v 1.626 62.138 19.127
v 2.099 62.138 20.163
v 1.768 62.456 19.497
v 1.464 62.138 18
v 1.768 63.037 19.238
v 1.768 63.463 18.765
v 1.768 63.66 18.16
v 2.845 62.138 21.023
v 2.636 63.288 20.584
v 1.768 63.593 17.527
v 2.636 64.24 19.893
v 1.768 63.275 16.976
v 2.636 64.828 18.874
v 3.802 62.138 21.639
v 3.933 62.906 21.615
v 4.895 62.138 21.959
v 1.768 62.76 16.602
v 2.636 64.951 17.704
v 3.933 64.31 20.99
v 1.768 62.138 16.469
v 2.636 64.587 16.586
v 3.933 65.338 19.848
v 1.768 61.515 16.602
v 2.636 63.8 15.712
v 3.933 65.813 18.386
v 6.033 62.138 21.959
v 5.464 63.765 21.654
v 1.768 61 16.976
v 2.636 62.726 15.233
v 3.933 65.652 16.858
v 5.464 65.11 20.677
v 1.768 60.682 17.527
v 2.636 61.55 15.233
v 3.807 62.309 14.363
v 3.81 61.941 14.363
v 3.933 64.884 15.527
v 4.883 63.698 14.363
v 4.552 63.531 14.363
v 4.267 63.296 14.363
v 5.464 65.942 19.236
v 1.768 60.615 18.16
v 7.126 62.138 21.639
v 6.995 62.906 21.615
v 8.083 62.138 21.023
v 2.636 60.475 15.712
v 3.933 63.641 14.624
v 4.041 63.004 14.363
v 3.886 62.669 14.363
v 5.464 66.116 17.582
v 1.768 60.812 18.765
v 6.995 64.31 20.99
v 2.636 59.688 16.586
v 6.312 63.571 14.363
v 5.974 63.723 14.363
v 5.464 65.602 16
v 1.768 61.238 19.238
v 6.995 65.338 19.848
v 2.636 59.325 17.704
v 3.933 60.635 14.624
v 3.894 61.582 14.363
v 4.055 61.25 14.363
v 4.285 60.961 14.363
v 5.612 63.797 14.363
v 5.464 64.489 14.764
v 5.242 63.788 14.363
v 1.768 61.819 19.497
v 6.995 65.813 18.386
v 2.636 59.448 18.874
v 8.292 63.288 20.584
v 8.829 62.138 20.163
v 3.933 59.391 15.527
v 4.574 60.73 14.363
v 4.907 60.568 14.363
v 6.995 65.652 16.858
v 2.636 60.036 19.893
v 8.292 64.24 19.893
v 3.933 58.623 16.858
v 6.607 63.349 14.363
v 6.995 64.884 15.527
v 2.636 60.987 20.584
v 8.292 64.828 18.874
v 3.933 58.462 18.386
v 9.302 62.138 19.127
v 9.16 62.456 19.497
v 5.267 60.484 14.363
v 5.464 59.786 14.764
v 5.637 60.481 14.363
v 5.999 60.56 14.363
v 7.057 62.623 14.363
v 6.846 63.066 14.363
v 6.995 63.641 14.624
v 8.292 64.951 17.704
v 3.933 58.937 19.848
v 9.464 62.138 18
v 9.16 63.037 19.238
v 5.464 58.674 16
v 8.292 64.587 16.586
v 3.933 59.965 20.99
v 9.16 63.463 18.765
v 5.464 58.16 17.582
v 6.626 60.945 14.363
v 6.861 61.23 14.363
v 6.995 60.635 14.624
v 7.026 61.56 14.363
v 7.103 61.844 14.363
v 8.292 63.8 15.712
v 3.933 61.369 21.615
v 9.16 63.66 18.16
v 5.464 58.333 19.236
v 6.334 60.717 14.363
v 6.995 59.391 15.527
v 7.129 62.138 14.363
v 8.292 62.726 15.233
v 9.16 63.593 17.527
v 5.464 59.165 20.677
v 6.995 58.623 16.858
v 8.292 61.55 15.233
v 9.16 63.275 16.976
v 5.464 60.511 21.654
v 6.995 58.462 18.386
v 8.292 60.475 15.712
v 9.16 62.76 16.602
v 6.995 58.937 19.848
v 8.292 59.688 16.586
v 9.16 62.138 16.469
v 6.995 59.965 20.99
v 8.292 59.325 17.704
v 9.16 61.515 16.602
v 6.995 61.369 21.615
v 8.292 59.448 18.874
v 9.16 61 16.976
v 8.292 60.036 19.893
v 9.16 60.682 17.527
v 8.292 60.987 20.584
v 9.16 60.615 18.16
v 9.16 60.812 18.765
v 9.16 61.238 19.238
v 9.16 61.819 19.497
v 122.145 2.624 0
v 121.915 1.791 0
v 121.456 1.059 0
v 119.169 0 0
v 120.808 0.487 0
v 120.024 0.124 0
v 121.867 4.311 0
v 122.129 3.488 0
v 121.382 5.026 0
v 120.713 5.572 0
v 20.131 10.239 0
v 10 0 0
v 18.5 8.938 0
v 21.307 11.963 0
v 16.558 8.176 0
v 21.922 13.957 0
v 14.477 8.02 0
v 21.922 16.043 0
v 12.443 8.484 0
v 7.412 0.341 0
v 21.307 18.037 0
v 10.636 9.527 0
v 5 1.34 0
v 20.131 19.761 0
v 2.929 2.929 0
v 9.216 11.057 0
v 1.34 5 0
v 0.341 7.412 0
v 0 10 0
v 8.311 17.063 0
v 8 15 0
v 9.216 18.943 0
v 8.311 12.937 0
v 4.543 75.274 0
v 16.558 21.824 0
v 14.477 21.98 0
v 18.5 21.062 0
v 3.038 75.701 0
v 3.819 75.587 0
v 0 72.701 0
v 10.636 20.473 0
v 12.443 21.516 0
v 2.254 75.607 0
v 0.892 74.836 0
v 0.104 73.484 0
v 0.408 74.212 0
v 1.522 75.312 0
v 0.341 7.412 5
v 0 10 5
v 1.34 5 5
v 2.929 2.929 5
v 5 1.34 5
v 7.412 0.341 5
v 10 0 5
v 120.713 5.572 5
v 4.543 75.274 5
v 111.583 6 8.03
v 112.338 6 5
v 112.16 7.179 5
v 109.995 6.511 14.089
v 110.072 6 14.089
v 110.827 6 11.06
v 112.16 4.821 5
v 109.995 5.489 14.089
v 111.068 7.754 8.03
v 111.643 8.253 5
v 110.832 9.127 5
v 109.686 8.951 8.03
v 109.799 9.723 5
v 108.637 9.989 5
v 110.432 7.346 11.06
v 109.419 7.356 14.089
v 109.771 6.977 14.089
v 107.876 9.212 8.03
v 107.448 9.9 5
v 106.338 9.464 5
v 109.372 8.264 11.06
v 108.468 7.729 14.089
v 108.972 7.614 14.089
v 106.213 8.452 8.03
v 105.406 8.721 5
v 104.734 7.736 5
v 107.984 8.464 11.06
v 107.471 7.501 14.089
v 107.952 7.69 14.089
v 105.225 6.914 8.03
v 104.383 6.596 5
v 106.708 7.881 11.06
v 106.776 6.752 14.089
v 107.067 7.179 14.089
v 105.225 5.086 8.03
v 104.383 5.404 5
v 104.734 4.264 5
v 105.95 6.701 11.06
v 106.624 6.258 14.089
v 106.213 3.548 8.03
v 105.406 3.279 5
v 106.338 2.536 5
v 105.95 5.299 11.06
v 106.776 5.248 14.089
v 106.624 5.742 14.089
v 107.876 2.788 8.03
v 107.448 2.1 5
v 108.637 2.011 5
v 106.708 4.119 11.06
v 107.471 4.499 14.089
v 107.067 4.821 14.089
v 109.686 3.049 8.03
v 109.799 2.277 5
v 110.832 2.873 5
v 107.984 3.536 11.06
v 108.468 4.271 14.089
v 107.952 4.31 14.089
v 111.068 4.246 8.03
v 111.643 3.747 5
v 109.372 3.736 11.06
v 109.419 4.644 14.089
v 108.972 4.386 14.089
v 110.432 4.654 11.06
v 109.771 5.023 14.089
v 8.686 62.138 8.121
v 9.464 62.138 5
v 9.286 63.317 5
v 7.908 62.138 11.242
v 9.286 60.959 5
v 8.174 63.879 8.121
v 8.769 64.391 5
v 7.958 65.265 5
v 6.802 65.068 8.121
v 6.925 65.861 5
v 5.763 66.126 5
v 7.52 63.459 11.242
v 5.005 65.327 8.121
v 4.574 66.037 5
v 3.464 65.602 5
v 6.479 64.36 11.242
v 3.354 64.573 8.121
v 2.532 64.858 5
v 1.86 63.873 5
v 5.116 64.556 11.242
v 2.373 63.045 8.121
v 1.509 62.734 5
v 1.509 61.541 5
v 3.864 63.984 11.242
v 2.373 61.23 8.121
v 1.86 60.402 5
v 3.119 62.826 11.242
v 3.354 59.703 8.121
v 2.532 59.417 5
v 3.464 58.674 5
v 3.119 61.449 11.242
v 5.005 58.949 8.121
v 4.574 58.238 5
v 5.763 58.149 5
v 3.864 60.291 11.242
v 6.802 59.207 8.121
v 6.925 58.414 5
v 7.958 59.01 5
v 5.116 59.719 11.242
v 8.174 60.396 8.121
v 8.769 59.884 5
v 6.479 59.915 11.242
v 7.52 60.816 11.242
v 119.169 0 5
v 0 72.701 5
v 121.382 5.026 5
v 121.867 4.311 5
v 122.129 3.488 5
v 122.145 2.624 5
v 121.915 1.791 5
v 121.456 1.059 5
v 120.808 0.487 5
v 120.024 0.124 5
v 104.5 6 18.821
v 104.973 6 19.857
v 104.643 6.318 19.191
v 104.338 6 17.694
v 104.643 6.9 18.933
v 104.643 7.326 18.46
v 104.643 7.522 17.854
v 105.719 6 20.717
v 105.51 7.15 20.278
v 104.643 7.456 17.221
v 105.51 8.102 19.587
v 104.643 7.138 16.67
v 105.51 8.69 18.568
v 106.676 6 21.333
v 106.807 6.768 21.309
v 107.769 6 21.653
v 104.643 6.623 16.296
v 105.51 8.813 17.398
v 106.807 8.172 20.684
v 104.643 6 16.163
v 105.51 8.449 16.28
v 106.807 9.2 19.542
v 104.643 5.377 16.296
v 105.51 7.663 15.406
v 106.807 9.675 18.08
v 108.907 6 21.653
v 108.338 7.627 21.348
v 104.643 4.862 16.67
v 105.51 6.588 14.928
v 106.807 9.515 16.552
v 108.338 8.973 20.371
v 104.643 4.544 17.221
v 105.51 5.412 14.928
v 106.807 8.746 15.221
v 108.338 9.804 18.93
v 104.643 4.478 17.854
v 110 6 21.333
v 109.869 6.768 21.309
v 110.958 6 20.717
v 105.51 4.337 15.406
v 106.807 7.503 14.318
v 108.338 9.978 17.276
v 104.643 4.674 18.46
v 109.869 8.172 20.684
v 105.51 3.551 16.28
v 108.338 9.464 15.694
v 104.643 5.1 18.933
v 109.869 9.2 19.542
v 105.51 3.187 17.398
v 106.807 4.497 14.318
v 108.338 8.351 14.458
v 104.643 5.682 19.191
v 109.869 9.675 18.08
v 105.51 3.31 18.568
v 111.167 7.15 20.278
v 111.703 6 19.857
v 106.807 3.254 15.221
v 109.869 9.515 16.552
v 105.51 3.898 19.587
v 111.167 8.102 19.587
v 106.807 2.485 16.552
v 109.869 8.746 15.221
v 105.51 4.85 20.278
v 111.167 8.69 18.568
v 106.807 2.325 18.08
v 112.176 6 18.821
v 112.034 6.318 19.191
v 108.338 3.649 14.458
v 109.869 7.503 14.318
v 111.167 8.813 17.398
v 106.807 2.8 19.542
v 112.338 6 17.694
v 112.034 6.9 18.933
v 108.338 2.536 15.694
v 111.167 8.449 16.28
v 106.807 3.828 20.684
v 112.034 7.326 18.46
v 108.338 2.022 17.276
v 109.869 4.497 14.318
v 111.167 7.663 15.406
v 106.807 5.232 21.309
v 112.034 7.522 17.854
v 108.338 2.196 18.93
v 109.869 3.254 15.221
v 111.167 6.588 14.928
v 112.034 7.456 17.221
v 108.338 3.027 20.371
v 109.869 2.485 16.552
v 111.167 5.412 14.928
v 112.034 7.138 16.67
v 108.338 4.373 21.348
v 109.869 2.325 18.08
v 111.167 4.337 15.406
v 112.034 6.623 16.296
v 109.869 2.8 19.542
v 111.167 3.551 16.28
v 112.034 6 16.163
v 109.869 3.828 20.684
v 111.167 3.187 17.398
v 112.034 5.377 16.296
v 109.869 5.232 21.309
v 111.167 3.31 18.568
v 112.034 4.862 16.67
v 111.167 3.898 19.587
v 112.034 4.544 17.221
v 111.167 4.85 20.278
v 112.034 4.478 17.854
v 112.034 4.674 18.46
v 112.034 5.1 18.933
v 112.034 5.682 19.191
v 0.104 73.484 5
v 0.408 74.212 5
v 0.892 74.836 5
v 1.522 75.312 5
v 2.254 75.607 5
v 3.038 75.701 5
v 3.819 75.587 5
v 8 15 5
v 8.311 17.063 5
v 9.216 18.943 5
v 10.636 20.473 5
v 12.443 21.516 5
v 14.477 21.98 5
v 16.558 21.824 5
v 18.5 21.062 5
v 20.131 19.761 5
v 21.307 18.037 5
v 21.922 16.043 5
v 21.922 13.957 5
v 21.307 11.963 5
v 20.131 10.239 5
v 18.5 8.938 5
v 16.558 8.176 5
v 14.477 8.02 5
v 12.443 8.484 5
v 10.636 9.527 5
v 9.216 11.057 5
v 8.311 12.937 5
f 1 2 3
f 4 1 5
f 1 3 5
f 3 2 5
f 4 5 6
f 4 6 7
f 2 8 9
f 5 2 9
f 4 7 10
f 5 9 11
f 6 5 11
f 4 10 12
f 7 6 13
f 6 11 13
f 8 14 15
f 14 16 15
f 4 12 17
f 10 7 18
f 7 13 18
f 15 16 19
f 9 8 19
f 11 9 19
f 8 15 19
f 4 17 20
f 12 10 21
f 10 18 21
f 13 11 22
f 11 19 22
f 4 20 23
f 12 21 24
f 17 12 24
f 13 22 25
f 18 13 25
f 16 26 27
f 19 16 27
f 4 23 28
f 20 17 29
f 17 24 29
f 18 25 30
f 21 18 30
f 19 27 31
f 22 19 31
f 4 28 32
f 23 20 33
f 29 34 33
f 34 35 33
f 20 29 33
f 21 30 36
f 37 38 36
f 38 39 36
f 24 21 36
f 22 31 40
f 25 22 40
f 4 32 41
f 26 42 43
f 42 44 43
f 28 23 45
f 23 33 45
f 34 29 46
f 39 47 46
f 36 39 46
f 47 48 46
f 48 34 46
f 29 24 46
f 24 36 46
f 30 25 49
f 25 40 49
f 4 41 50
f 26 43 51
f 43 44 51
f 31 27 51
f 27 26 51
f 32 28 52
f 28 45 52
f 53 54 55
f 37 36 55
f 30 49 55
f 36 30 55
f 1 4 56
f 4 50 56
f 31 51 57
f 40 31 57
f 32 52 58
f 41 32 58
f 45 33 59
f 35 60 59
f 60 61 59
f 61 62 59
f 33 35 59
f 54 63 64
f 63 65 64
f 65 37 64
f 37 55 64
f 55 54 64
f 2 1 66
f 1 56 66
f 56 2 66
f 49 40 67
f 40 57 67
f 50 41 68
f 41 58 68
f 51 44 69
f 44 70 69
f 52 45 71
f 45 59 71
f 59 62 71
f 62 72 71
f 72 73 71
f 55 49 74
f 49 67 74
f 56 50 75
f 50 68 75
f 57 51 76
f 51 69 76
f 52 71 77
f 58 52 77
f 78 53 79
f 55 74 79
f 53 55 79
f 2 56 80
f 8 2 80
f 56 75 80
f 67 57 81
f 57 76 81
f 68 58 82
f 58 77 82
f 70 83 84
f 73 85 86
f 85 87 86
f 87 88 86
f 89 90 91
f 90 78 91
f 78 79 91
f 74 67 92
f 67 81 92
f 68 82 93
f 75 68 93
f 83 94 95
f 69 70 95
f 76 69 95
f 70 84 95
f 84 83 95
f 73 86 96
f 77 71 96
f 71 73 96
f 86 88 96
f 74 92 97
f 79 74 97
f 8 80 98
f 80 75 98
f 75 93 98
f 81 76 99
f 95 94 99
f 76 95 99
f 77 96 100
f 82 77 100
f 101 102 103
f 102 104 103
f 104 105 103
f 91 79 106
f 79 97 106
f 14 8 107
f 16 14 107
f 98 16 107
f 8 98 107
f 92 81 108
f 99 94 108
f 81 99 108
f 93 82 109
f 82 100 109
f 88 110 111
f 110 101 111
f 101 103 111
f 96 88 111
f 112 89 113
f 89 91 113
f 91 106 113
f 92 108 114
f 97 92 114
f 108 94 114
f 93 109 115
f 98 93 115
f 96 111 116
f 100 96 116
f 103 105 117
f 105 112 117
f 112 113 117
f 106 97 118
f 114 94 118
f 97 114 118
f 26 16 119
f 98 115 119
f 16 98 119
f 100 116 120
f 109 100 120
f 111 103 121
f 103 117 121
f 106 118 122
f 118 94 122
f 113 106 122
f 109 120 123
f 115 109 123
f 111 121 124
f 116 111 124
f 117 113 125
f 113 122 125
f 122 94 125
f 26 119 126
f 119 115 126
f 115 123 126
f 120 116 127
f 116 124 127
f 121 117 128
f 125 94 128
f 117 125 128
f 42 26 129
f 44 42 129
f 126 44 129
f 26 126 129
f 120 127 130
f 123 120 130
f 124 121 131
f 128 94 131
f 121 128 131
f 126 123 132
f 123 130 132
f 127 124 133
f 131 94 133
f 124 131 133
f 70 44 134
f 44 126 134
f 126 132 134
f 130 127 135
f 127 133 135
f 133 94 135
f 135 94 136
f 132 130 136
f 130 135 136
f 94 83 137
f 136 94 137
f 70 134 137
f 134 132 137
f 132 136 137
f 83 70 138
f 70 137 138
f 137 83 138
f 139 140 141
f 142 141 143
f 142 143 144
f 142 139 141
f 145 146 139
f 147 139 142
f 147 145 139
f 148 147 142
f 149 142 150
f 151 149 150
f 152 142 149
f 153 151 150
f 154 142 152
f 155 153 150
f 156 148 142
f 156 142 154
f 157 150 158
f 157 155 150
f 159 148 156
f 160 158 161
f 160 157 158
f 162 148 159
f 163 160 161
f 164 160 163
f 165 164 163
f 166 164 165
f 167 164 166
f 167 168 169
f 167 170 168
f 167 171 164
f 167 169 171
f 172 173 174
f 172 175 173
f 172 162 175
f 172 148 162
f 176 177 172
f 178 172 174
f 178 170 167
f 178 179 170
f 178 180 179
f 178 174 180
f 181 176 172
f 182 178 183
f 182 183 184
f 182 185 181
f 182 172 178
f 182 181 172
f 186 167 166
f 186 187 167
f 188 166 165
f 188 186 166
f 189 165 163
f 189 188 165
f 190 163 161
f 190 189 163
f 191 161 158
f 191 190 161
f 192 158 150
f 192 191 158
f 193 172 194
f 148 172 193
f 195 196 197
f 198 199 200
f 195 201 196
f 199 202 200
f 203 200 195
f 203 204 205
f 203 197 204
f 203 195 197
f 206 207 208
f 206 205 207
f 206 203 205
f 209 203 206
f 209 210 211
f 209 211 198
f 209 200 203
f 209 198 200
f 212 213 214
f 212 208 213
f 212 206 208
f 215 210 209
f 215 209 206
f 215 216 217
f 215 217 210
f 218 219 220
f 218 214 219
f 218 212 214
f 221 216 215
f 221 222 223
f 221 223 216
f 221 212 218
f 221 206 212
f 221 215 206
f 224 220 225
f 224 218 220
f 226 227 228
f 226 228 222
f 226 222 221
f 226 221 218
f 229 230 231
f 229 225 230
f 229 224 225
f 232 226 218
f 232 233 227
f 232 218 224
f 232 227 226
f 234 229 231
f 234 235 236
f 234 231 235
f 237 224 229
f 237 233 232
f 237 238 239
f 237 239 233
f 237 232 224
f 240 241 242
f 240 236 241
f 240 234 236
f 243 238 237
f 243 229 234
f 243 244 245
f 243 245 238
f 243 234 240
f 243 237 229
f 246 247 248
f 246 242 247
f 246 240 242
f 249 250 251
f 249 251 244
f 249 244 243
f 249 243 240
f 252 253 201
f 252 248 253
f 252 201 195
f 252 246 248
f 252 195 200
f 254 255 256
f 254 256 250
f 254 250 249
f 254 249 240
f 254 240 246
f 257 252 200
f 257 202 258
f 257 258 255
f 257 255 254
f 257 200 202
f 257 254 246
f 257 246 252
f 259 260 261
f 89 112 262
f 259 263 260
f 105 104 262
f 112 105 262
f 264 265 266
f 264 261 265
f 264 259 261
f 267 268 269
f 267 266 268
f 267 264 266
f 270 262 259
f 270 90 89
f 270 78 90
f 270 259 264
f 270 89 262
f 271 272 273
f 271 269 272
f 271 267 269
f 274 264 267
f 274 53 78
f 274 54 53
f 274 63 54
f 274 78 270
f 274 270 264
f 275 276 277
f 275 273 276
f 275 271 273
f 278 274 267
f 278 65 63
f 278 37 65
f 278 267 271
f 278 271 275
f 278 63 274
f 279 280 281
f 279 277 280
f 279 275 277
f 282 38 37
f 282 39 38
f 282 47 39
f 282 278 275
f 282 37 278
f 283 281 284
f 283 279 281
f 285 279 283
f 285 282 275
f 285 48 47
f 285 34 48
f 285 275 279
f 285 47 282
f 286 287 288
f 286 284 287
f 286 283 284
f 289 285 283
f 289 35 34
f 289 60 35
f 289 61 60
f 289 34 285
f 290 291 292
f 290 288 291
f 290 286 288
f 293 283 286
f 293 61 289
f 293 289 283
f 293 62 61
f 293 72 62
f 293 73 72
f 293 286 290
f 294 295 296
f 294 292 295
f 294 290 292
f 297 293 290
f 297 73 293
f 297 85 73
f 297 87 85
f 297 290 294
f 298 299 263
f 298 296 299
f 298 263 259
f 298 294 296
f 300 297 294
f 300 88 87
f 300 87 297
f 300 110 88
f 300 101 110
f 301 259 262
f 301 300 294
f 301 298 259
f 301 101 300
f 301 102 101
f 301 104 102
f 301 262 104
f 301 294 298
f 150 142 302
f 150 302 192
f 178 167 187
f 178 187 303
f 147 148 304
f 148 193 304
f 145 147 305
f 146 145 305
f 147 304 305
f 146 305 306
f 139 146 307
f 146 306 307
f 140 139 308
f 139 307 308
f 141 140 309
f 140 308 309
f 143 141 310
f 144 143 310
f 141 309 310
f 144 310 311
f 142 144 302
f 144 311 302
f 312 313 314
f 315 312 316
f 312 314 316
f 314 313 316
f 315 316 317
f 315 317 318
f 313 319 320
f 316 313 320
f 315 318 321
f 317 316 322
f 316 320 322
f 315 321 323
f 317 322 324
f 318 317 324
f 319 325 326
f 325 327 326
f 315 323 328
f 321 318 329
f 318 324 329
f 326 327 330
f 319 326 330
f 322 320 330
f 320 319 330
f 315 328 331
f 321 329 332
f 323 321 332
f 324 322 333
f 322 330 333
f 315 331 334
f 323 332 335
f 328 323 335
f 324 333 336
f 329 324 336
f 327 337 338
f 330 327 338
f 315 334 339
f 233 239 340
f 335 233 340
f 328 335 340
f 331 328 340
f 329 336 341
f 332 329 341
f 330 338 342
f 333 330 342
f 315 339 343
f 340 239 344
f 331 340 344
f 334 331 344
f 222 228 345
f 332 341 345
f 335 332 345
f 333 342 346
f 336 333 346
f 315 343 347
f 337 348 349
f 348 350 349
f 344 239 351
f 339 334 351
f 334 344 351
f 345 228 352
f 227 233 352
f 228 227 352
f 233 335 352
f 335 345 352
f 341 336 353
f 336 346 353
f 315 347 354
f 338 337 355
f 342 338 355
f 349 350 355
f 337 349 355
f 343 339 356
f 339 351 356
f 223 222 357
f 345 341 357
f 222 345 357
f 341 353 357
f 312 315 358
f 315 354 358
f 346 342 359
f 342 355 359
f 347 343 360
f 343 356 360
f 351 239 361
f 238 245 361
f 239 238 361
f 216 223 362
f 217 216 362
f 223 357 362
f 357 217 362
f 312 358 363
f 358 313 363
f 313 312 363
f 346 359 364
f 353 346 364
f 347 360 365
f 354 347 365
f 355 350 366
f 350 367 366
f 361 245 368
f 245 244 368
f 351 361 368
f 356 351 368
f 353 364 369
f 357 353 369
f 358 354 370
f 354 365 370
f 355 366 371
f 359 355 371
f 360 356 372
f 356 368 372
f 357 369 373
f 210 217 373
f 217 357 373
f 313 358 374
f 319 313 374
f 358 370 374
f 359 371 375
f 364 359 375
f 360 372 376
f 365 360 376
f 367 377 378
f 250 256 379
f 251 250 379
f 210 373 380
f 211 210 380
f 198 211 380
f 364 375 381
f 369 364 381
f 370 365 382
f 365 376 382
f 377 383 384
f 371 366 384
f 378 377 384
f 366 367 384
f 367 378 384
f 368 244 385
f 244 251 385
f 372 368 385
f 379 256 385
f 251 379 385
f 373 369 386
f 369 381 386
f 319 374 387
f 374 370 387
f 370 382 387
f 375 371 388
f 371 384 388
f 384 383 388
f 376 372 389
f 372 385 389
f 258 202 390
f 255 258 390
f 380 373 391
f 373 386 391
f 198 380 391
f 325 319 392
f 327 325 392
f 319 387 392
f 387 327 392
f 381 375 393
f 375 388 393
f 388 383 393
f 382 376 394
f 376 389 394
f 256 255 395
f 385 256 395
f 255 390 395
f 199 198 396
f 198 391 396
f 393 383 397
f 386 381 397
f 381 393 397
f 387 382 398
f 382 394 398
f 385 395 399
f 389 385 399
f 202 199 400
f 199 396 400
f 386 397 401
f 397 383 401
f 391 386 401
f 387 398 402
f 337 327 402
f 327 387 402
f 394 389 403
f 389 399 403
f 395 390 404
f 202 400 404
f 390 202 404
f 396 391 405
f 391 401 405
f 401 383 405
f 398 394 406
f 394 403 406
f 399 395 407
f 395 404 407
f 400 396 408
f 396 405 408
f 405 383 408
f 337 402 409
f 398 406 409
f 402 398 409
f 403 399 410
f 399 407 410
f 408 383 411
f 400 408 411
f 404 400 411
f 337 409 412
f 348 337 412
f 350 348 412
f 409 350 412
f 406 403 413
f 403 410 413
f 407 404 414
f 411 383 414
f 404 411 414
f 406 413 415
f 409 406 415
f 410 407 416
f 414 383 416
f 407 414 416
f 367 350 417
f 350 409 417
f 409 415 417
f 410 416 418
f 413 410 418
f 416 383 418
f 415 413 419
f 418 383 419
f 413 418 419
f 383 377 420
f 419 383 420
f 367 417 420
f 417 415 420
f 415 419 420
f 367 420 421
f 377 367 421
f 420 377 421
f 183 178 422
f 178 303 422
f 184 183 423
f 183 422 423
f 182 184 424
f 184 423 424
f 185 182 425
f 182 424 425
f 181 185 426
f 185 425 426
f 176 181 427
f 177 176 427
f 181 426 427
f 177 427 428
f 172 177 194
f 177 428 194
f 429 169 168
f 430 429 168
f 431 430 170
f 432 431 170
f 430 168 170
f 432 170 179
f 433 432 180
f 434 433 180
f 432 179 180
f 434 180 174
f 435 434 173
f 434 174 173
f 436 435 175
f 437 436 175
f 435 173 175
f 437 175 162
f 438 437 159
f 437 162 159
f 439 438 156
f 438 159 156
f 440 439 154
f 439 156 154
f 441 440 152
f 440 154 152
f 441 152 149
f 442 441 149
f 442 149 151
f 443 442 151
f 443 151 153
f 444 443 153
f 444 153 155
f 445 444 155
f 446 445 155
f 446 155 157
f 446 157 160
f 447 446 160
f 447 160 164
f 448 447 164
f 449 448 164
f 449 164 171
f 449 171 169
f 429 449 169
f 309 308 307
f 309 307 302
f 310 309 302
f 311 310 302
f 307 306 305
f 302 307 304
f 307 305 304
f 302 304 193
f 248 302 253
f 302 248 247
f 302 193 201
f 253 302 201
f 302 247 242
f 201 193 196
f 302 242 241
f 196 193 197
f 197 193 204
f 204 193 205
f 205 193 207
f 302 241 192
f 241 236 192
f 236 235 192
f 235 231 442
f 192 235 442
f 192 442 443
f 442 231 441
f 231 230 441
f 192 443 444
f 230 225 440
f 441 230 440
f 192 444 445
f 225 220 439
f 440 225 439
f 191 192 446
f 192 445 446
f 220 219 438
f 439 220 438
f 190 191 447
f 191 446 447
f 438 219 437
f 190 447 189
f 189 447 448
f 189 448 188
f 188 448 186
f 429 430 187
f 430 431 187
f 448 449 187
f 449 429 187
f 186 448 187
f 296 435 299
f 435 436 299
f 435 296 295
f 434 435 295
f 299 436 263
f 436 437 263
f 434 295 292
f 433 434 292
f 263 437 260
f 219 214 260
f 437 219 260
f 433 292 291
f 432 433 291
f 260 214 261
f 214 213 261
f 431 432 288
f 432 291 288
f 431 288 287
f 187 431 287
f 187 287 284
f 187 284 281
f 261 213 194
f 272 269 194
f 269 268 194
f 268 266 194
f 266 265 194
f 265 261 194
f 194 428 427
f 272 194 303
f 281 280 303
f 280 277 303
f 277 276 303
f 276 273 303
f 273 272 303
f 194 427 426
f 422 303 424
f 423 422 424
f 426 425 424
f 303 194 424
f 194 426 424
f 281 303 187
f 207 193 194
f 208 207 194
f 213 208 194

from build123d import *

# Parameters (mm, degrees)
ESTRUSIONE_ESTRUSIONE1_DEPTH = 5
SCHIZZO2_R                   = 7
TAGLIO_ESTRUSIONE1_DEPTH     = 152.6871781
RACCORDO1_R                  = 10
SCHIZZO3_R                   = 4
ESTRUSIONE_ESTRUSIONE2_DEPTH = 10
ESTRUSIONE_ESTRUSIONE2_TAPER = 14
RACCORDO2_R                  = 3
SCHIZZO6_R                   = 4
ESTRUSIONE_ESTRUSIONE3_DEPTH = 10
ESTRUSIONE_ESTRUSIONE3_TAPER = 14


with BuildPart() as part:
    # Schizzo1 → Estrusione-Estrusione1 (new body)
    with BuildSketch(Plane.XY):
        Polygon((0, 0), (0, 78), (130, 0), align=None)
    extrude(amount=ESTRUSIONE_ESTRUSIONE1_DEPTH)

    # Schizzo2 → Taglio-Estrusione1 (cut, through all)
    with BuildSketch(Plane(origin=(0, 0, 0), x_dir=(-1, 0, 0), z_dir=(0, 0, -1))):
        with Locations((-15, 15)):
            Circle(SCHIZZO2_R)
    extrude(amount=-TAGLIO_ESTRUSIONE1_DEPTH, mode=Mode.SUBTRACT)

    # Raccordo1
    raccordo1_edges = [part.edges().sort_by_distance(p)[0] for p in [
        (0, 0, 2.5),
    ]]
    fillet(raccordo1_edges, radius=RACCORDO1_R)

    # Schizzo3 → Estrusione-Estrusione2 (add)
    with BuildSketch(Plane.XY.offset(5)):
        with Locations((5.463985213, 62.137606809)):
            Circle(SCHIZZO3_R)
    extrude(amount=ESTRUSIONE_ESTRUSIONE2_DEPTH, taper=ESTRUSIONE_ESTRUSIONE2_TAPER)

    # Schizzo5 → Rivoluzione1 (revolve)
    with BuildSketch(Plane(origin=(0, 62.137606809, 0), x_dir=(1, 0, 0), z_dir=(0, 1, 0))):
        with BuildLine():
            Line((9.463985213, -18), (1.463985213, -18))
            ThreePointArc((1.463985213, -18), (5.463985213, -22), (9.463985213, -18))
        make_face()
    revolve(axis=Axis((9.463985213, 62.137606809, 18), (-1, 0, 0)))

    # Raccordo2
    raccordo2_edges = [part.edges().sort_by_distance(p)[0] for p in [
        (0, 78, 2.5),
        (130, 0, 2.5),
    ]]
    fillet(raccordo2_edges, radius=RACCORDO2_R)

    # Schizzo6 → Estrusione-Estrusione3 (add)
    with BuildSketch(Plane.XY.offset(5)):
        with Locations((108.33809621, 6)):
            Circle(SCHIZZO6_R)
    extrude(amount=ESTRUSIONE_ESTRUSIONE3_DEPTH, taper=ESTRUSIONE_ESTRUSIONE3_TAPER)

    # Schizzo9 → Rivoluzione3 (revolve)
    with BuildSketch(Plane(origin=(0, 6, 0), x_dir=(1, 0, 0), z_dir=(0, 1, 0))):
        with BuildLine():
            Line((112.33809621, -17.694136404), (104.33809621, -17.694136404))
            ThreePointArc((104.33809621, -17.694136404), (108.33809621, -21.694136404), (112.33809621, -17.694136404))
        make_face()
    revolve(axis=Axis((112.33809621, 6, 17.694136404), (-1, 0, 0)))


solid = part.part
